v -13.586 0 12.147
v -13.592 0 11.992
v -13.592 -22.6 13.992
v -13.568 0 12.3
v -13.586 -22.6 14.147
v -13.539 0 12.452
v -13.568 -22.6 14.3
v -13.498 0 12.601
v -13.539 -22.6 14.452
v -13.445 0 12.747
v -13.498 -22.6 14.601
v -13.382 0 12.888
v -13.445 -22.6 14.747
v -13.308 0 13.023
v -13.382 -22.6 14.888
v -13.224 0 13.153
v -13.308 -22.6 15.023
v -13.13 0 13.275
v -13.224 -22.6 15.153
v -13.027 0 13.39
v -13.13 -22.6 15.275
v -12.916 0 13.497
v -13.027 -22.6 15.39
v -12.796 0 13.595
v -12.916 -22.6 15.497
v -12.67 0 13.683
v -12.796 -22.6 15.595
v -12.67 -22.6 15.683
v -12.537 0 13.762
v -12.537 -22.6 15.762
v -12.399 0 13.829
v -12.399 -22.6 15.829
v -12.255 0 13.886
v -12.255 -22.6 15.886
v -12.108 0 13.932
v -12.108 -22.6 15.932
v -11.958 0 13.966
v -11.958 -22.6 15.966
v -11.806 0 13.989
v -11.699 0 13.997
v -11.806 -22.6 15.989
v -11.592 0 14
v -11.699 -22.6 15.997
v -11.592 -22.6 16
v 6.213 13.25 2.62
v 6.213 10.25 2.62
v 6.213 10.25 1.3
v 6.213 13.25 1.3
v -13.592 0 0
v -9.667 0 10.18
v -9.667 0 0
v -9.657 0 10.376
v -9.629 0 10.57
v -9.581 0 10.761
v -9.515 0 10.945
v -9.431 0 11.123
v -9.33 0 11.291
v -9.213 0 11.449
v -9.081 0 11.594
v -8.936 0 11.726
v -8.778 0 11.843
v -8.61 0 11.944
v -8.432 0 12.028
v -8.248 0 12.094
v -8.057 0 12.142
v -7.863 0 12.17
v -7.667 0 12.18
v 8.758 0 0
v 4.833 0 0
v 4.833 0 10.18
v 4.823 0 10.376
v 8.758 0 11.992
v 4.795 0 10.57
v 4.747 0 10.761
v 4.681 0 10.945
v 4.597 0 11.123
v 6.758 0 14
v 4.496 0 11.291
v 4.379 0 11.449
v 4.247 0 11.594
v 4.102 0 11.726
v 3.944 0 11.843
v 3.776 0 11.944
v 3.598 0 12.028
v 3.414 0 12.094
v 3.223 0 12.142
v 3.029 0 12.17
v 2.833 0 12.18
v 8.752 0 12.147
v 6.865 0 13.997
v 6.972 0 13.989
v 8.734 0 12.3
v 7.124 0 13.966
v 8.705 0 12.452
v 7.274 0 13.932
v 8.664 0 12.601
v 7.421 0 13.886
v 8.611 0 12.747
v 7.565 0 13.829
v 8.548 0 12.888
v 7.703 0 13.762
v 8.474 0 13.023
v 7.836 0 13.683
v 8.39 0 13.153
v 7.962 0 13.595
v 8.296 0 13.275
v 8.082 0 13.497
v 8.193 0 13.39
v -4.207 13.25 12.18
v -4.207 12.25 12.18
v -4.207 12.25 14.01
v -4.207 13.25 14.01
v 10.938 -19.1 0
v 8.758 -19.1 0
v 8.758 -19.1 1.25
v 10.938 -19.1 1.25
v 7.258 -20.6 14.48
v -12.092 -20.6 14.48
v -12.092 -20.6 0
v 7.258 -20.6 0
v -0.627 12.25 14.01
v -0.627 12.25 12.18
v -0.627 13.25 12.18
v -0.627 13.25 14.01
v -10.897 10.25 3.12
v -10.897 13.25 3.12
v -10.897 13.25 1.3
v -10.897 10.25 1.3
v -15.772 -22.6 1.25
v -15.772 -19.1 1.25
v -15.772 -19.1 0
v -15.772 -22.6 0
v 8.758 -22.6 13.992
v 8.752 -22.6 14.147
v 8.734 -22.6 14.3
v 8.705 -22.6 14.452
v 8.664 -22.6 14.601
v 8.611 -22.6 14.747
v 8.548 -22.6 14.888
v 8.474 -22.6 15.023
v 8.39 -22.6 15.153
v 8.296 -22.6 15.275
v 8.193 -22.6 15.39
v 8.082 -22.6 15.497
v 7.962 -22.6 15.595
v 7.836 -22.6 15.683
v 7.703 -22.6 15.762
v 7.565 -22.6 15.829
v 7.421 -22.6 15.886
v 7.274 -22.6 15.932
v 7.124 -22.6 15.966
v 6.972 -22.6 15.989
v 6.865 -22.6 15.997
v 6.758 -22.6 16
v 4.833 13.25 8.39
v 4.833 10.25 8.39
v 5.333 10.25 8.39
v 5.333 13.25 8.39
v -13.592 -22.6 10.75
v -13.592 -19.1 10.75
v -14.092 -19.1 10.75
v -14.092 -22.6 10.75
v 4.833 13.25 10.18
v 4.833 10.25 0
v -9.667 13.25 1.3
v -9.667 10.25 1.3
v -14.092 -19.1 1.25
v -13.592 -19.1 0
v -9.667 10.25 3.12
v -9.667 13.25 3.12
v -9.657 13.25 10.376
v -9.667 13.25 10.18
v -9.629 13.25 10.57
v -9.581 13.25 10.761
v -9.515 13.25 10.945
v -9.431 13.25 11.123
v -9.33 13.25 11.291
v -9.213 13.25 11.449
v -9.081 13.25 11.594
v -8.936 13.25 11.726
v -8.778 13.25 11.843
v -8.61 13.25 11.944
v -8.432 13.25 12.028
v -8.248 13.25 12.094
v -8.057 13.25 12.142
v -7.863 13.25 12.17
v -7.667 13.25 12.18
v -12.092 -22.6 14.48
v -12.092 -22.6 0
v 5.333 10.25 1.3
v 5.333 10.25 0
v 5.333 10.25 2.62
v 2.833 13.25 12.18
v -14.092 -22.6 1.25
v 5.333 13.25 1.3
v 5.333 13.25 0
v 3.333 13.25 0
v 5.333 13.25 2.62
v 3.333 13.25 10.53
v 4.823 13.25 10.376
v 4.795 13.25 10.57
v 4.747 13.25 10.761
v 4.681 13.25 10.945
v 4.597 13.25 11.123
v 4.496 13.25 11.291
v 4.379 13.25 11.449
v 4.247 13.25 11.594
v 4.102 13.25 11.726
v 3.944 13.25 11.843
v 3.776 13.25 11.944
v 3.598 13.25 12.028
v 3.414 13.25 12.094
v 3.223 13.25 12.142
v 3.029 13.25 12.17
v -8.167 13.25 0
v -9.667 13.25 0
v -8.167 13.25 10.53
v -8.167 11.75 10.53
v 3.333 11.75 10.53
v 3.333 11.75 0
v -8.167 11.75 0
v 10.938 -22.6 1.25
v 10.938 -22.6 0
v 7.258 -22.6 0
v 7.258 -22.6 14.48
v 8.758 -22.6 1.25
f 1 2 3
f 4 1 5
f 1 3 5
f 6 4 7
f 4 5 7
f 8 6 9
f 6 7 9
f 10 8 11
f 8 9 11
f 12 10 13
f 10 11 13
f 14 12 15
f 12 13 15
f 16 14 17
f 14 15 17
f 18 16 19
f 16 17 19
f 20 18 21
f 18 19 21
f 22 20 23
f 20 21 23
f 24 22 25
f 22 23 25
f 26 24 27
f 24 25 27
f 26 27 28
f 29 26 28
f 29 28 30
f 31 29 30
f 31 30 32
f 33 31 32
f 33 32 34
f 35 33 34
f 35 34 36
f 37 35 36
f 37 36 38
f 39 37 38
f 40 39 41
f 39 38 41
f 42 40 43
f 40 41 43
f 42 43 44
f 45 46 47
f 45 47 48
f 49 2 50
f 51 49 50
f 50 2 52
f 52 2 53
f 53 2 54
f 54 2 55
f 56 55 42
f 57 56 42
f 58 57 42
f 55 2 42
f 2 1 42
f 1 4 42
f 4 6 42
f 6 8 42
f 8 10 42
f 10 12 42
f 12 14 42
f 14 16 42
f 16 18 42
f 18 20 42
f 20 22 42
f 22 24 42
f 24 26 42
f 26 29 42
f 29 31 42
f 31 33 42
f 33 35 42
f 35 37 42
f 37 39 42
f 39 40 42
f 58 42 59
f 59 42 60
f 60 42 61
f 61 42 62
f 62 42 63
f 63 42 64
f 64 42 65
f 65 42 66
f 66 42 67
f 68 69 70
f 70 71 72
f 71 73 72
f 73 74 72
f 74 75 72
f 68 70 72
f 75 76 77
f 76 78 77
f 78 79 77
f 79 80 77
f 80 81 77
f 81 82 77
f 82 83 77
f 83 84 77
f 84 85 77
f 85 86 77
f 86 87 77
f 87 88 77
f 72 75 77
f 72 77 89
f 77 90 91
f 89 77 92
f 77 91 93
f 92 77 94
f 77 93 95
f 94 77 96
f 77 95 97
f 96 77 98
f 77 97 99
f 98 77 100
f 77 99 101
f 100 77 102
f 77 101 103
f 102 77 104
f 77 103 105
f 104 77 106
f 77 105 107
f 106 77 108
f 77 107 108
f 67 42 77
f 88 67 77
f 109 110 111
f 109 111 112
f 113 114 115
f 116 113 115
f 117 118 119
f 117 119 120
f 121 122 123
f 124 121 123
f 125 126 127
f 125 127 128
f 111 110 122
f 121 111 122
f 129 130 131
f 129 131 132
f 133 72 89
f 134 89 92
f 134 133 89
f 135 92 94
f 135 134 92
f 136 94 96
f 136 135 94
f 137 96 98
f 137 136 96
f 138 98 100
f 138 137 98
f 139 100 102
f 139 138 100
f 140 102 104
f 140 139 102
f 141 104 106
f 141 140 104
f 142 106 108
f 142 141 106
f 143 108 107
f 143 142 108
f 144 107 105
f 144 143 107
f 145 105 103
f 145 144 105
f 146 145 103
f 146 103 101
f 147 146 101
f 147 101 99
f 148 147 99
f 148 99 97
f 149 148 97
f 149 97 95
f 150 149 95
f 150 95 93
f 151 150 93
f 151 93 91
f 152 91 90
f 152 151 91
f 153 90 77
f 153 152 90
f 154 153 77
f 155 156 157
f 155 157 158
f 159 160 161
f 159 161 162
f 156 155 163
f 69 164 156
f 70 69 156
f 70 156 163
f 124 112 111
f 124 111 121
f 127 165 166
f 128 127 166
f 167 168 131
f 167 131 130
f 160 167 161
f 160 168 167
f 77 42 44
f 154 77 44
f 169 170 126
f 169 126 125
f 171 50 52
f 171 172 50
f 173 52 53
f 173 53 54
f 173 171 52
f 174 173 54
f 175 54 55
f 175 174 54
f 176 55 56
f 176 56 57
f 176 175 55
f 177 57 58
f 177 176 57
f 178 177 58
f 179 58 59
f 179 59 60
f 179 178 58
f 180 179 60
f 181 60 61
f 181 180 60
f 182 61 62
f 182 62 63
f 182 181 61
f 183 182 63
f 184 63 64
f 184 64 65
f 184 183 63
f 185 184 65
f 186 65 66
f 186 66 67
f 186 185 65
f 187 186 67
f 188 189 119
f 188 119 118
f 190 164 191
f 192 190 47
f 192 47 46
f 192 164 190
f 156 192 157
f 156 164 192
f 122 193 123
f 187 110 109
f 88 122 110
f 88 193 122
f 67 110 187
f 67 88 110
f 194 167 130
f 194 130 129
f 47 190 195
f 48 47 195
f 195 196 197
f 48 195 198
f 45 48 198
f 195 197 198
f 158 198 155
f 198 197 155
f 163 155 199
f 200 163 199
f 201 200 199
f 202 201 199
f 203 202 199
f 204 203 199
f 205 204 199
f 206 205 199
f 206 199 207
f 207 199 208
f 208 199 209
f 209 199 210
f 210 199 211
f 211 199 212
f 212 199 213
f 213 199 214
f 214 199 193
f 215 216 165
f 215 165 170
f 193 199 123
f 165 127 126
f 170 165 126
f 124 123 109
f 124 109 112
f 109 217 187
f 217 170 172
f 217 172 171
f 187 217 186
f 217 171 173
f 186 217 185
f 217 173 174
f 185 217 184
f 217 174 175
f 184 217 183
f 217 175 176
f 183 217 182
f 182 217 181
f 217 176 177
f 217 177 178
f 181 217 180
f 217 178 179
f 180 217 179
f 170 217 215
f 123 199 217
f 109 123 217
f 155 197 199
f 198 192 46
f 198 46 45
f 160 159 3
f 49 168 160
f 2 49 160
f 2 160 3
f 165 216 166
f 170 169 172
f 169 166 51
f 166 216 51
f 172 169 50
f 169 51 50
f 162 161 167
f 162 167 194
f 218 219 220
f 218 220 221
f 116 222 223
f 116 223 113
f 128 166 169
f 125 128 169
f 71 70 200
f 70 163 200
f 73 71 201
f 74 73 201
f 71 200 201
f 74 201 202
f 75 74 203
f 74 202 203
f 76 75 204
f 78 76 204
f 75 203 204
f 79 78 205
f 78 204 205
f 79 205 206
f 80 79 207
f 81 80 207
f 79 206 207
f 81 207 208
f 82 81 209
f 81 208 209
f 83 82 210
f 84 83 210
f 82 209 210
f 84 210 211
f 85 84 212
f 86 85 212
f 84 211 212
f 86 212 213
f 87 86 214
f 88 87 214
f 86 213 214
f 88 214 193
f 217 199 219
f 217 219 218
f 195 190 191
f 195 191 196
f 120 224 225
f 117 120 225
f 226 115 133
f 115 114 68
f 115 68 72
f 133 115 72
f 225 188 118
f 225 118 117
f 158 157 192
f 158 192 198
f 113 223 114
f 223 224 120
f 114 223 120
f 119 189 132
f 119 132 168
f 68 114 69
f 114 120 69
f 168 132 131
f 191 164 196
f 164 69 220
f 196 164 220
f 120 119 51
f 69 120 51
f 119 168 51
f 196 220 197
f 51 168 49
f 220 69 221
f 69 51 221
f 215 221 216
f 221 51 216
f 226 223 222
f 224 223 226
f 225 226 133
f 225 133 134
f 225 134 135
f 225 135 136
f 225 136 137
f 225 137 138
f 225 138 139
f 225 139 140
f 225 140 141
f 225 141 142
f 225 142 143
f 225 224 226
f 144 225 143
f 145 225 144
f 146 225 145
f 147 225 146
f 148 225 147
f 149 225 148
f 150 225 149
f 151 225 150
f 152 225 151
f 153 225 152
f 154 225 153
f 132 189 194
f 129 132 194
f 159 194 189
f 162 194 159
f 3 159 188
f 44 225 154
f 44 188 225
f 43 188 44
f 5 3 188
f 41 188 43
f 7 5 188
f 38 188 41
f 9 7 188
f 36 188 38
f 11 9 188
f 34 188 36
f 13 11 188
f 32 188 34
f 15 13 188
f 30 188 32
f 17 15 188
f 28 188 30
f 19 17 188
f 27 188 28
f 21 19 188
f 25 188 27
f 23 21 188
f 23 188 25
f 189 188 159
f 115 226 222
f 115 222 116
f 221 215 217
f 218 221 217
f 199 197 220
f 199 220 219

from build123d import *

# Parameters (mm, degrees)
F0_W      = 22.35
F0_H      = 16
F1_DEPTH  = 22.6
F2_W      = 19.35
F2_H      = 14.48
F3_DEPTH  = 2
F5_DEPTH  = 25
F6_W      = 3.5
F6_H      = 1.25
F7_DEPTH  = 2.18
F8_W      = 3.5
F8_H      = 1.25
F9_DEPTH  = 2.18
F10_W     = 3.5
F10_H     = 10.75
F11_DEPTH = 0.5
F12_W     = 14.5
F12_H     = 12.18
F13_DEPTH = 13.25
F14_W     = 11.5
F14_H     = 10.53
F15_DEPTH = 1.5
F16_W     = 3.58
F16_H     = 1
F17_DEPTH = 1.83
F18_W     = 3
F18_H     = 8.39
F19_DEPTH = 0.5
F20_W     = 3
F20_H     = 1.32
F21_DEPTH = 0.88
F22_W     = 3
F22_H     = 1.82
F23_DEPTH = 1.23
F24_R     = 2


with BuildPart() as f1:
    # F0 (on Front) → F1 (new body)
    with BuildSketch(Plane.XZ):
        with Locations((-2.416973, 8)):
            Rectangle(F0_W, F0_H)
    extrude(amount=F1_DEPTH)

    # F2 (on face) → F3 (cut)
    with BuildSketch(Plane.XZ.offset(22.6)):
        with Locations((-2.416973, 7.24)):
            Rectangle(F2_W, F2_H)
    extrude(amount=-F3_DEPTH, mode=Mode.SUBTRACT)

    # F4 (on face) → F5 (cut)
    with BuildSketch(Plane(origin=(-13.591973, 0, 0), x_dir=(0, -1, 0), z_dir=(-1, 0, 0))):
        Polygon((0, 16), (0, 14), (22.6, 16), align=None)
    extrude(amount=-F5_DEPTH, mode=Mode.SUBTRACT)

    # F6 (on face) → F7 (join)
    with BuildSketch(Plane(origin=(-13.591973, 0, 0), x_dir=(0, -1, 0), z_dir=(-1, 0, 0))):
        with Locations((20.85, 0.625)):
            Rectangle(F6_W, F6_H)
    extrude(amount=F7_DEPTH)

    # F8 (on face) → F9 (join)
    with BuildSketch(Plane.YZ.offset(8.758027)):
        with Locations((-20.85, 0.625)):
            Rectangle(F8_W, F8_H)
    extrude(amount=F9_DEPTH)

    # F10 (on face) → F11 (join)
    with BuildSketch(Plane(origin=(-13.591973, 0, 0), x_dir=(0, -1, 0), z_dir=(-1, 0, 0))):
        with Locations((20.85, 5.375)):
            Rectangle(F10_W, F10_H)
    extrude(amount=F11_DEPTH)

    # F12 (on face) → F13 (join)
    with BuildSketch(Plane(origin=(0, 0, 0), x_dir=(-1, 0, 0), z_dir=(0, 1, 0))):
        with Locations((2.416973, 6.09)):
            Rectangle(F12_W, F12_H)
    extrude(amount=F13_DEPTH)

    # F14 (on face) → F15 (cut)
    with BuildSketch(Plane(origin=(0, 13.25, 0), x_dir=(-1, 0, 0), z_dir=(0, 1, 0))):
        with Locations((2.416973, 5.265)):
            Rectangle(F14_W, F14_H)
    extrude(amount=-F15_DEPTH, mode=Mode.SUBTRACT)

    # F16 (on face) → F17 (join)
    with BuildSketch(Plane.XY.offset(12.18)):
        with Locations((-2.416973, 12.75)):
            Rectangle(F16_W, F16_H)
    extrude(amount=F17_DEPTH)

    # F18 (on face) → F19 (join)
    with BuildSketch(Plane.YZ.offset(4.833027)):
        with Locations((11.75, 4.195)):
            Rectangle(F18_W, F18_H)
    extrude(amount=F19_DEPTH)

    # F20 (on face) → F21 (join)
    with BuildSketch(Plane.YZ.offset(5.333027)):
        with Locations((11.75, 1.96)):
            Rectangle(F20_W, F20_H)
    extrude(amount=F21_DEPTH)

    # F22 (on face) → F23 (join)
    with BuildSketch(Plane(origin=(-9.666973, 0, 0), x_dir=(0, -1, 0), z_dir=(-1, 0, 0))):
        with Locations((-11.75, 2.21)):
            Rectangle(F22_W, F22_H)
    extrude(amount=F23_DEPTH)

    # F24
    f24_edges = [f1.edges().sort_by_distance(p)[0] for p in [
        (-13.591973, -11.3, 15),
        (8.758027, -11.3, 15),
        (4.833027, 6.625, 12.18),
        (-9.666973, 6.625, 12.18),
    ]]
    fillet(f24_edges, radius=F24_R)


solid = f1.part
